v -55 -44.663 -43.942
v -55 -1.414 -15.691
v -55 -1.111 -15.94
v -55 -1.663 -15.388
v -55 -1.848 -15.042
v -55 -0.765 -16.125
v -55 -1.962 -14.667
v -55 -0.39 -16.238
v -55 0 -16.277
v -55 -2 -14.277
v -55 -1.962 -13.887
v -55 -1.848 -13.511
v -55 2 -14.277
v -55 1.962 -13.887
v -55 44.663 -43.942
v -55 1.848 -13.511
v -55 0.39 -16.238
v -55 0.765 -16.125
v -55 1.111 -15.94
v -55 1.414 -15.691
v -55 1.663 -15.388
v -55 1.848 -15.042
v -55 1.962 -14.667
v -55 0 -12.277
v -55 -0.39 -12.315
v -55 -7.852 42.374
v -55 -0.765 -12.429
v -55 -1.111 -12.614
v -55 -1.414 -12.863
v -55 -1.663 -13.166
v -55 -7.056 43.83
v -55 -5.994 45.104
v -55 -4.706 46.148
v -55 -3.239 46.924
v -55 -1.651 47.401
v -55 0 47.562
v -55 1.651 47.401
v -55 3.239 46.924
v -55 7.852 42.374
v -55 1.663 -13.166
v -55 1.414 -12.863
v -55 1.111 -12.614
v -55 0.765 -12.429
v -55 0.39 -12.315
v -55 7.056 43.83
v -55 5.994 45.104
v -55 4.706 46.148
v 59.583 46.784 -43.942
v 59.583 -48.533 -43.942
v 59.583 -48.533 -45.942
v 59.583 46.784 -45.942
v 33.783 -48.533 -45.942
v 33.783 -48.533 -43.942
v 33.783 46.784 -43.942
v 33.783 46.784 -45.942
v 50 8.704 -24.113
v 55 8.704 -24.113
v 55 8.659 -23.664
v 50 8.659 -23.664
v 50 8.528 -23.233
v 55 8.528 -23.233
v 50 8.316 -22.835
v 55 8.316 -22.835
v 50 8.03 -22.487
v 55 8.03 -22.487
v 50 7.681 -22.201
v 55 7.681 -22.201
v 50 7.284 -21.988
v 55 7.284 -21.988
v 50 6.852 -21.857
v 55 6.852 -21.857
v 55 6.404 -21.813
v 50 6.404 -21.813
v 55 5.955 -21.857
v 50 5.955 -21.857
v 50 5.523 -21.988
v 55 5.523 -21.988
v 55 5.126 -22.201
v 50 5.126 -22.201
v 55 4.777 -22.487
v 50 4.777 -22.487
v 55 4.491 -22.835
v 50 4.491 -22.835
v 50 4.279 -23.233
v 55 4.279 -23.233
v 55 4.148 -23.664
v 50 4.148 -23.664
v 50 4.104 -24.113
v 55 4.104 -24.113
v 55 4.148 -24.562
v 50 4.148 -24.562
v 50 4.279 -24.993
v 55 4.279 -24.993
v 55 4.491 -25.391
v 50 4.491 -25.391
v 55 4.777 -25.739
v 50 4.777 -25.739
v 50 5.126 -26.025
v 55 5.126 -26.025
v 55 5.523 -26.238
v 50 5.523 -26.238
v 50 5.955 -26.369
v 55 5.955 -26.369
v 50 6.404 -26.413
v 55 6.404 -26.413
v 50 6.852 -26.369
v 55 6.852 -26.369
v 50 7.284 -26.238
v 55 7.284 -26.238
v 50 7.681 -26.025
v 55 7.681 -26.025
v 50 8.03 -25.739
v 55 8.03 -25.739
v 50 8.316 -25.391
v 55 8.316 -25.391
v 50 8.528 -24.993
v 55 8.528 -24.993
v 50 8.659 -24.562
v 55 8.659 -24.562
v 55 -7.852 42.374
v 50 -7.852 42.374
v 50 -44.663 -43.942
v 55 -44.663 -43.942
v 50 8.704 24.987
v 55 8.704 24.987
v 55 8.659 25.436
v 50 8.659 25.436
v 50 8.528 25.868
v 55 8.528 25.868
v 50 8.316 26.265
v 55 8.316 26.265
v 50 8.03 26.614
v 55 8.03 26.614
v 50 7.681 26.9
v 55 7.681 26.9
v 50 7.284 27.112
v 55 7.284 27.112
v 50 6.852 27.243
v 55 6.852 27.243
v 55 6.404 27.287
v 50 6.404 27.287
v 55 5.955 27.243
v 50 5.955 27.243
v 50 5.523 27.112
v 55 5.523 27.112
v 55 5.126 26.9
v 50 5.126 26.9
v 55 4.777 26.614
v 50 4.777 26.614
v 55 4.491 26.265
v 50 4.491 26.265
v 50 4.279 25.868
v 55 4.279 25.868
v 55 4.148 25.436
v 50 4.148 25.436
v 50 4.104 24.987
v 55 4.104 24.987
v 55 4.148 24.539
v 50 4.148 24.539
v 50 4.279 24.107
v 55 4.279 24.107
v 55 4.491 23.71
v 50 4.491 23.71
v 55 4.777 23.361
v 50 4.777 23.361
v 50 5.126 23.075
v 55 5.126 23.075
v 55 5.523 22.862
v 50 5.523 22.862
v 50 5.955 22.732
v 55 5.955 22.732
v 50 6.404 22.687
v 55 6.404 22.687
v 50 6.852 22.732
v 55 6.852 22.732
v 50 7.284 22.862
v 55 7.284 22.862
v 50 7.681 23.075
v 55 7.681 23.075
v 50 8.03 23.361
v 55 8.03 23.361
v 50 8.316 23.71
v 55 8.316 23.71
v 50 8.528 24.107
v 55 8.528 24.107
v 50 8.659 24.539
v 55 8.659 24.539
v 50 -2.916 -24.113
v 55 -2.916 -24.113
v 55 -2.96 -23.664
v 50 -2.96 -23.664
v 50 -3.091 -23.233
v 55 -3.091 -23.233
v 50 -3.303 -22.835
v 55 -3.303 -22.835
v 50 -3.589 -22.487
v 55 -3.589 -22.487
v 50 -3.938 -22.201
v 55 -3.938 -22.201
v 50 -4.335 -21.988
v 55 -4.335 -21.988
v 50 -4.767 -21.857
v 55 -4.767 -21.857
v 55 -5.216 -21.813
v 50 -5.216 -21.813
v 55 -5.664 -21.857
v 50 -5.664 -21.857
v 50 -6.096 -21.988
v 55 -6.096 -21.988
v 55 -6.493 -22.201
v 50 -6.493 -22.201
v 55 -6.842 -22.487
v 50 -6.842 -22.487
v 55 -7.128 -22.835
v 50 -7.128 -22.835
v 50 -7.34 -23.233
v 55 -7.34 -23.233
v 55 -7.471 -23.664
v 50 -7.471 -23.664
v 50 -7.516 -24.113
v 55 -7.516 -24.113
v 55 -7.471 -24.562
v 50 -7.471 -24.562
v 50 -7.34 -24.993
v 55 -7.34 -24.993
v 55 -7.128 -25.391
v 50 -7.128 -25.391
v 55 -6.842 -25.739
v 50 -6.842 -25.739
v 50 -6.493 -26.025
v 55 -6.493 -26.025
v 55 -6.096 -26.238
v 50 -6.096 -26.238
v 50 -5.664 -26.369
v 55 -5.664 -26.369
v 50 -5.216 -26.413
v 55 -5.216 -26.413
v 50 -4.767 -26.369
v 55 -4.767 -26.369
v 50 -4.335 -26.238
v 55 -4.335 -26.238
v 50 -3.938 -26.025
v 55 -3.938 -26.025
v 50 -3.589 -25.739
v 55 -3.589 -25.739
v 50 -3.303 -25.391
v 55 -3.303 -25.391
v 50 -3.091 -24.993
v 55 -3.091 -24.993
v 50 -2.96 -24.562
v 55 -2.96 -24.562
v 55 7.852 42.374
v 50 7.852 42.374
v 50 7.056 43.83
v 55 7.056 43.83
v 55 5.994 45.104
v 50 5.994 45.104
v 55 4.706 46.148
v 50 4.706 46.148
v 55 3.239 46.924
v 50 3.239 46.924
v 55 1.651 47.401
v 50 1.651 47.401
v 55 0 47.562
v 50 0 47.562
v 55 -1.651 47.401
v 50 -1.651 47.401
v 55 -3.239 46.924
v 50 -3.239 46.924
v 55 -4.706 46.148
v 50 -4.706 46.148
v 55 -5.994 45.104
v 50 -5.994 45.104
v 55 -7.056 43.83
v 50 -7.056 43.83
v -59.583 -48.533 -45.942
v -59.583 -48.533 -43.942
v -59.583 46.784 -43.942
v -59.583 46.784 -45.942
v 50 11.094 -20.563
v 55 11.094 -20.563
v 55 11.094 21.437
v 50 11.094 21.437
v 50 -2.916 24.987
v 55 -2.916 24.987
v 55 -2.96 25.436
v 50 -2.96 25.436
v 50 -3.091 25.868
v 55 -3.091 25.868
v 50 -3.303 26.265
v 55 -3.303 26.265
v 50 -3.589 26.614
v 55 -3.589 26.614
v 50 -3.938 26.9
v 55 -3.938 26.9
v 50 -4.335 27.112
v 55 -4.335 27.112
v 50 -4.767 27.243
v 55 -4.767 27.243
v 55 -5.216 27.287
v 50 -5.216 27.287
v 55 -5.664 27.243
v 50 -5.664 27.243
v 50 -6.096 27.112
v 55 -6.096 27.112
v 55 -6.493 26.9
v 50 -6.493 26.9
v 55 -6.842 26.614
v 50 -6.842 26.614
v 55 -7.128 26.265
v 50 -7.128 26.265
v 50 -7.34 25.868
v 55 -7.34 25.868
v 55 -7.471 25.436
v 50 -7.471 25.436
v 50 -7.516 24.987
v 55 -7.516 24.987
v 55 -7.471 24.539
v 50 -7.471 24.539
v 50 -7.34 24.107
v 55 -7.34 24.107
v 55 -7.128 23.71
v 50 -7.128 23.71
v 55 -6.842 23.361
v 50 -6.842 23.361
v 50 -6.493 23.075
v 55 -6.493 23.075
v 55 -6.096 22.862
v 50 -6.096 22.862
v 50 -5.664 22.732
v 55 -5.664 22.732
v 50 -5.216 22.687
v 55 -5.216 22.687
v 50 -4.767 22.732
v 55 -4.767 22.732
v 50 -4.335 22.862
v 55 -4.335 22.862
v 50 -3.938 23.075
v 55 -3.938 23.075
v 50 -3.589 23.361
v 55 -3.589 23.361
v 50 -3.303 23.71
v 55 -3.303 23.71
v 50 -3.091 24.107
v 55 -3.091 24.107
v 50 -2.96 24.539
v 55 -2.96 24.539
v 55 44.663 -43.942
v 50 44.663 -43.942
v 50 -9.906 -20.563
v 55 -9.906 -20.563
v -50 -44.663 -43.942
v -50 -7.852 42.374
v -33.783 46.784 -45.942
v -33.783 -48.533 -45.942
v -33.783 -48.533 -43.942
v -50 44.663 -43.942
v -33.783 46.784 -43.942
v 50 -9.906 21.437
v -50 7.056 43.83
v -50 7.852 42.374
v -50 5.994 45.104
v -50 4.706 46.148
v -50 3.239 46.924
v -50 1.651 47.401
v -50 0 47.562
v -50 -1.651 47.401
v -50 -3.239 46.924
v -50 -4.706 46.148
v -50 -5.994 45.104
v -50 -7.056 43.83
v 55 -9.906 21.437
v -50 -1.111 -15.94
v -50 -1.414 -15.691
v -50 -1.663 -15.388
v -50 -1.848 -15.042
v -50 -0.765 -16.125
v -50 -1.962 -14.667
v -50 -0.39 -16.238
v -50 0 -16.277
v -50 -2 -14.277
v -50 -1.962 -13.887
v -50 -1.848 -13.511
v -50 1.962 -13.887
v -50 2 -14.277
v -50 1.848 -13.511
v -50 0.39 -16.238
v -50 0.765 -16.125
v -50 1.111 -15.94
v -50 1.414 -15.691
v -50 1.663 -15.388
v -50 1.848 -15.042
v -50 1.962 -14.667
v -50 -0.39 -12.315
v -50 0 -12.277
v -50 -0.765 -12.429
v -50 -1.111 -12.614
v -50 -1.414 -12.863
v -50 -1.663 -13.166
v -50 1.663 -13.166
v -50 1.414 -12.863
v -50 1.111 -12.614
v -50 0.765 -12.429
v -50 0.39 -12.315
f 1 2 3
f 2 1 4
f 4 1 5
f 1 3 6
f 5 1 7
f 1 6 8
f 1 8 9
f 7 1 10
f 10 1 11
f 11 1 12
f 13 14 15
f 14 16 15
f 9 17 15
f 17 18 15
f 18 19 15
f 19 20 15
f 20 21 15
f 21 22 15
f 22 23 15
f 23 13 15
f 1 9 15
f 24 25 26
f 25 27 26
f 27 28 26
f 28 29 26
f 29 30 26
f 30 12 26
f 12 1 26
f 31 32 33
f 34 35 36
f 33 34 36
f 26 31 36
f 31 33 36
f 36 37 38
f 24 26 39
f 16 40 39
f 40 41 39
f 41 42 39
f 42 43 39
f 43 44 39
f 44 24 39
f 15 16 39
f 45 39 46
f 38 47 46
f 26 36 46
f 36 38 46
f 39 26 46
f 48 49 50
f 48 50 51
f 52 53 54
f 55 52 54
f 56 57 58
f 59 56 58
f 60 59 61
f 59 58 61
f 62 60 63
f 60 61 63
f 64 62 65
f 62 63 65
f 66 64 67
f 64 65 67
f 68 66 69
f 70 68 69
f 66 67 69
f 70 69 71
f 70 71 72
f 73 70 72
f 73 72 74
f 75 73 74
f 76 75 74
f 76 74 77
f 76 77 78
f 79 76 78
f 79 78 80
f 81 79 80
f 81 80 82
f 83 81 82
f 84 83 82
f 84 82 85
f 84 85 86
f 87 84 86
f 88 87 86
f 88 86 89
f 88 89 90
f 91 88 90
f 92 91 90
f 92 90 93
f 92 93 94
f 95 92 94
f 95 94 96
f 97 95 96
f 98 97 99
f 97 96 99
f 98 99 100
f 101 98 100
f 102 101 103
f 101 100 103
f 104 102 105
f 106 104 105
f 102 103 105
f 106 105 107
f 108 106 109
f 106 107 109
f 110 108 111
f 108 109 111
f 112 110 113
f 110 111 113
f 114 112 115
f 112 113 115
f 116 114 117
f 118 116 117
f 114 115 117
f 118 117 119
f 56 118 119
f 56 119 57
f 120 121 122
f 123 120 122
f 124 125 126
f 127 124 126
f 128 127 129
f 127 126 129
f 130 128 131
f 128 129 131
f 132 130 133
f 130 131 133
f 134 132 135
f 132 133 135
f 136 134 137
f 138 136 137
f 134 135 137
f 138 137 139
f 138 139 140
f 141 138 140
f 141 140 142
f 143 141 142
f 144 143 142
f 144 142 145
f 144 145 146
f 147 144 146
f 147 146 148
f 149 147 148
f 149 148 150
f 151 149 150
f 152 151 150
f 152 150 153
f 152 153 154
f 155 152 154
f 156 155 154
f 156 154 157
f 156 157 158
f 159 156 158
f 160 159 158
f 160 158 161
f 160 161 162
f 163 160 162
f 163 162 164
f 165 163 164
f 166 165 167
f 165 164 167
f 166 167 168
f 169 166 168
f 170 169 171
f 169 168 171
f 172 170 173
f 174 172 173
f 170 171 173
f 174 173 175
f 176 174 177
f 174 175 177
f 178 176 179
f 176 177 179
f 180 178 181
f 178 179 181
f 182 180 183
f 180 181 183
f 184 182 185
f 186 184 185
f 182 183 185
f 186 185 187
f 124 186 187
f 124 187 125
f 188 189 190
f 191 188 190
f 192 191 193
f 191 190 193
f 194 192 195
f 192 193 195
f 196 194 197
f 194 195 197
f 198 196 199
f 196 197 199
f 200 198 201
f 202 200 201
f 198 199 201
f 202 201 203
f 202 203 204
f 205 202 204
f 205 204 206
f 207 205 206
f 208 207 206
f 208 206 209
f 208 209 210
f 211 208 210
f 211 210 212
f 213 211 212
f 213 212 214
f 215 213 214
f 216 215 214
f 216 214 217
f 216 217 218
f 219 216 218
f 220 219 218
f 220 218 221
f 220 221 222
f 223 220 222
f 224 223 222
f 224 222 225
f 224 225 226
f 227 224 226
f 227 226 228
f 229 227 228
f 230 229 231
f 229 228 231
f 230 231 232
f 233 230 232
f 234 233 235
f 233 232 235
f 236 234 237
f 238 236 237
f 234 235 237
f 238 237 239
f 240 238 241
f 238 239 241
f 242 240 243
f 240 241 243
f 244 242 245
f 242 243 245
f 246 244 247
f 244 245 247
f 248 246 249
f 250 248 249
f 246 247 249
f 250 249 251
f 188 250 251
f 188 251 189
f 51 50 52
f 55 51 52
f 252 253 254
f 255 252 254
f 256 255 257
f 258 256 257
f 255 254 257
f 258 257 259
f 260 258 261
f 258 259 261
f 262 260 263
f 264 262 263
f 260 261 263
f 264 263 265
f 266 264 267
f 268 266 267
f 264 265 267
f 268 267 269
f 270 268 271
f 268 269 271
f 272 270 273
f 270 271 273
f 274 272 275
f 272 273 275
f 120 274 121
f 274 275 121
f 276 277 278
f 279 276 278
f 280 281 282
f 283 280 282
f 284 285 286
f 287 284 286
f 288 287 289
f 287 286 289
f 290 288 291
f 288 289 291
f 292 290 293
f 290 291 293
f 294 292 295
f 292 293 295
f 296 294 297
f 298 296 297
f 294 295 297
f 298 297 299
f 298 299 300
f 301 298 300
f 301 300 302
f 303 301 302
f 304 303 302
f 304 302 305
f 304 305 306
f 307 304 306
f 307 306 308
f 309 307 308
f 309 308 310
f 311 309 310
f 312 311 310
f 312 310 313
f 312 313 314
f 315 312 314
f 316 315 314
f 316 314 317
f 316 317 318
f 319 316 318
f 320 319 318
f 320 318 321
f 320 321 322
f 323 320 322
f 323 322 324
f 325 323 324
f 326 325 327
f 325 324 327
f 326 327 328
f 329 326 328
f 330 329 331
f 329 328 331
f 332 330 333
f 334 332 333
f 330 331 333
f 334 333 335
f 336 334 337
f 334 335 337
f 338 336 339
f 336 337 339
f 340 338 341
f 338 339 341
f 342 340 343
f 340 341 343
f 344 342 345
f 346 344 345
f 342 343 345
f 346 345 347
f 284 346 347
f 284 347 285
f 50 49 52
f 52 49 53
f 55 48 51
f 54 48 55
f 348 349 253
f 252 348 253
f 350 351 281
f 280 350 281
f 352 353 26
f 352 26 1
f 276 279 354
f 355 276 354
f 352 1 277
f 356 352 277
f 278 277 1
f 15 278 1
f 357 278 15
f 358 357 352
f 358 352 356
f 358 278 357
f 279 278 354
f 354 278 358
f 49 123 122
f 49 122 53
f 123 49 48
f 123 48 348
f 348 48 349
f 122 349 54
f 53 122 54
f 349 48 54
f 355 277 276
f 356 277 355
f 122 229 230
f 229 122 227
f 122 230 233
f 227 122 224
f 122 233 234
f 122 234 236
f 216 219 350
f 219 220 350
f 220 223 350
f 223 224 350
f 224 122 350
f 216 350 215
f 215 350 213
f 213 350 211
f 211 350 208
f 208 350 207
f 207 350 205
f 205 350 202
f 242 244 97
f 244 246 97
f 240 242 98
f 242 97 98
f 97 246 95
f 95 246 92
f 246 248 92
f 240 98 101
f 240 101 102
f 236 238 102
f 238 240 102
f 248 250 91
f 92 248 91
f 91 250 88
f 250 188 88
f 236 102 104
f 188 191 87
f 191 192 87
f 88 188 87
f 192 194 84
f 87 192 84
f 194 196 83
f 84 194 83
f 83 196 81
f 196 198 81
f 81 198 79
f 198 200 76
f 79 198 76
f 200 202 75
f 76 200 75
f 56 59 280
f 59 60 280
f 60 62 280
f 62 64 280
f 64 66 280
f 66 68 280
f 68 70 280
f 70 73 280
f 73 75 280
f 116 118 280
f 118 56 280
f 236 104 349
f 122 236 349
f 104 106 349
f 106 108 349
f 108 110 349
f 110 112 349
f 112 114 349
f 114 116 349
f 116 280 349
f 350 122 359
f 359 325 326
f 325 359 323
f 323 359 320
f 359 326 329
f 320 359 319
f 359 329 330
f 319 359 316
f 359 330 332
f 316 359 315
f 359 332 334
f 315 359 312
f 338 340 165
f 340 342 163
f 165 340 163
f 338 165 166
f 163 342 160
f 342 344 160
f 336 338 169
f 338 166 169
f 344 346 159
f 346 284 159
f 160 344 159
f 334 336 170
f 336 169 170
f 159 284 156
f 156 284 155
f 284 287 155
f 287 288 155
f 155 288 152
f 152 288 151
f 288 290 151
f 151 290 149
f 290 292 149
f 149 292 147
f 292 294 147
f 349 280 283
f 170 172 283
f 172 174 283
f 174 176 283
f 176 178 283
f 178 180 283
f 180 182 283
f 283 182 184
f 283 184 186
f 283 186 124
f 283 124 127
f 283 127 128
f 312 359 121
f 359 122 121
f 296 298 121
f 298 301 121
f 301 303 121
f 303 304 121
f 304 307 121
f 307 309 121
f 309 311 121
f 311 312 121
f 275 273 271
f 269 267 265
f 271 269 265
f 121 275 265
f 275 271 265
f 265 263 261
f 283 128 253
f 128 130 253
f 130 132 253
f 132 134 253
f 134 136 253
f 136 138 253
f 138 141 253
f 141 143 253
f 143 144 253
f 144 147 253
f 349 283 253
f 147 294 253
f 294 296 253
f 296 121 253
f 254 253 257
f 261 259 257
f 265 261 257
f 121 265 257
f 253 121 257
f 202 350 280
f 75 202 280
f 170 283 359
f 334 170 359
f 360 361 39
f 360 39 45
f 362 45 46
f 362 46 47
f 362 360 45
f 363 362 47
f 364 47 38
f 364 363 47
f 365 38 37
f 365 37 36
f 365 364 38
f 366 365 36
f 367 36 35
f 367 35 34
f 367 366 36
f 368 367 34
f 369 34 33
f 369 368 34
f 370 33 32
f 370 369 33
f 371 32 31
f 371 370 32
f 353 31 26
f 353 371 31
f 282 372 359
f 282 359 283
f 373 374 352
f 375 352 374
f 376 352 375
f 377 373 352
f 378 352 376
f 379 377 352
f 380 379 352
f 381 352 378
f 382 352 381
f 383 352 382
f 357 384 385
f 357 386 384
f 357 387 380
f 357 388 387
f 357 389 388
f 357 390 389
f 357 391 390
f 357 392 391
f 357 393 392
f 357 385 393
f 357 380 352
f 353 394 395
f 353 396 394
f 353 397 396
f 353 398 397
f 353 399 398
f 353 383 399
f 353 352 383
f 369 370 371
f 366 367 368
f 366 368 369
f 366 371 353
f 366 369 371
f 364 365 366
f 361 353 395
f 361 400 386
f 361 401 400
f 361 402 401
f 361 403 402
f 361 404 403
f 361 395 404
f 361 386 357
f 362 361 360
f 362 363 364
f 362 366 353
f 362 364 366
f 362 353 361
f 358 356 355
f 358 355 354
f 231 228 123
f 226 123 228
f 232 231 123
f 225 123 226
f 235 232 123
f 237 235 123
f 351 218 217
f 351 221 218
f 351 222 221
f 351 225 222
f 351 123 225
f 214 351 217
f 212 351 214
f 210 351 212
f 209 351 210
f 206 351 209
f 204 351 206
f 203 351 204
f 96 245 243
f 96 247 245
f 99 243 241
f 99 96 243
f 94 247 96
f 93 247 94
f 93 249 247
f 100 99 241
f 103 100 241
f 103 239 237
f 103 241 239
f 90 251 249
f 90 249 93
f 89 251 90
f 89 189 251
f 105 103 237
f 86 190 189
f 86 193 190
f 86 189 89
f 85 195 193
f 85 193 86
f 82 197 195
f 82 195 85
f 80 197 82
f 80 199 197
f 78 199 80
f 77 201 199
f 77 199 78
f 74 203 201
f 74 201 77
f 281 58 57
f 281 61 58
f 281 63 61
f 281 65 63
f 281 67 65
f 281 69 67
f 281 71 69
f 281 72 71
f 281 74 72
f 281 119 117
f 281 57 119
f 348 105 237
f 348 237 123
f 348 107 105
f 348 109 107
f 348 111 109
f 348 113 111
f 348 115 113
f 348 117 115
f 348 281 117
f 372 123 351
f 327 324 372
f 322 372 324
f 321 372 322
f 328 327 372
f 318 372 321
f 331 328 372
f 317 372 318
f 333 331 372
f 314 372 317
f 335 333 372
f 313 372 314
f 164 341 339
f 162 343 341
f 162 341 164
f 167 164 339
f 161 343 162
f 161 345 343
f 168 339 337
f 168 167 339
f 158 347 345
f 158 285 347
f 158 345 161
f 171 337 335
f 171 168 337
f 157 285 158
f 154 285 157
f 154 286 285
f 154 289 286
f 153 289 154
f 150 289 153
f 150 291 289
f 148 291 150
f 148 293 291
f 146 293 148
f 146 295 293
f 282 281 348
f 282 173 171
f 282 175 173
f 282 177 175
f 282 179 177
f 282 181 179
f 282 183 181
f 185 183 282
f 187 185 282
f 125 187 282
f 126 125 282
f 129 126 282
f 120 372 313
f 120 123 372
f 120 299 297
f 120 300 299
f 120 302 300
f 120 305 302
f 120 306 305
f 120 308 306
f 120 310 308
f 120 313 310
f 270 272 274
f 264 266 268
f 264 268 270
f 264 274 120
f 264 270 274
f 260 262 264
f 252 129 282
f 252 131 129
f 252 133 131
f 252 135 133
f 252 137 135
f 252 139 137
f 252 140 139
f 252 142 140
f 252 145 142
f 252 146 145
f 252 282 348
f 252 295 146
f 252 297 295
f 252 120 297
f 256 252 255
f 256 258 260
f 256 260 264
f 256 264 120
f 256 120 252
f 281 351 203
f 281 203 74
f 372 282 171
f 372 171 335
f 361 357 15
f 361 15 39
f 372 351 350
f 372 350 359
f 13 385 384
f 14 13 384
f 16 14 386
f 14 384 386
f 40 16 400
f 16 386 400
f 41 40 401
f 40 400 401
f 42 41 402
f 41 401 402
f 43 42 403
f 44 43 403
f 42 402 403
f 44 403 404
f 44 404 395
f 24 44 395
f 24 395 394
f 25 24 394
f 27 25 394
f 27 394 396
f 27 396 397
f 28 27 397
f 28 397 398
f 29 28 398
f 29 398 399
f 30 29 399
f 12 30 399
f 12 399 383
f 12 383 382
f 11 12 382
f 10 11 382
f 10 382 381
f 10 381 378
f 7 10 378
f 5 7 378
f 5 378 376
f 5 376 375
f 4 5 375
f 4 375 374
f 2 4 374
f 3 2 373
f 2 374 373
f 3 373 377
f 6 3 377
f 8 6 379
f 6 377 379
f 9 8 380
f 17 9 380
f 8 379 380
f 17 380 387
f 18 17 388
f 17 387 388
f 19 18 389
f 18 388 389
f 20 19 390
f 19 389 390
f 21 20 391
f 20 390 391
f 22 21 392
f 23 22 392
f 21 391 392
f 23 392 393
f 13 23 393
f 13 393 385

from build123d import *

# Parameters (mm, degrees)
F2_DEPTH  = 5
F5_W      = 25.799889
F5_H      = 95.316247
F6_DEPTH  = 2
F9_D      = 4
F9_DEPTH  = 15
F10_W     = 21
F10_H     = 42
F10_R     = 2.3
F11_DEPTH = 6


with BuildPart() as f2:
    # F1 (on offset) → F2 (new body)
    with BuildSketch(Plane.YZ.offset(50)):
        with BuildLine():
            Line((45.085, -44.93209), (7.852122, 42.374369))
            ThreePointArc((7.852122, 42.374369), (0, 47.562082), (-7.852122, 42.374369))
            Line((-7.852122, 42.374369), (-45.085, -44.93209))
            Line((-45.085, -44.93209), (0, -44.93209))
            Line((0, -44.93209), (45.085, -44.93209))
        make_face()
    extrude(amount=F2_DEPTH)

    # F7: F4_1 across plane


with BuildPart() as f4_1:
    # F4: instance of F2
    add(f2.part.mirror(Plane.YZ))

    # F5 (on offset) → F6 (join)
    with BuildSketch(Plane.XY.offset(-43.942)):
        with Locations((-46.683387, -0.874489)):
            Rectangle(F5_W, F5_H)
    extrude(amount=-F6_DEPTH)

    # F9
    with Locations(Plane(origin=(-55, 0, 0), x_dir=(0, -1, 0), z_dir=(-1, 0, 0))):
        with Locations((0, -14.276751)):
            Hole(F9_D / 2, depth=F9_DEPTH)


with BuildPart() as f2_1:
    add(f2.part)
    add(f4_1.part.mirror(Plane.YZ))

    # F10 (on face) → F11 (cut)
    with BuildSketch(Plane.YZ.offset(55)):
        with Locations((0.594001, 0.437133)):
            Rectangle(F10_W, F10_H)
        with Locations((-5.215549, 24.987351)):
            Circle(F10_R)
        with Locations((6.403552, 24.987351)):
            Circle(F10_R)
        with Locations((-5.215549, -24.113084)):
            Circle(F10_R)
        with Locations((6.403552, -24.113084)):
            Circle(F10_R)
    extrude(amount=-F11_DEPTH, mode=Mode.SUBTRACT)


solid = Compound([f4_1.part, f2_1.part])
